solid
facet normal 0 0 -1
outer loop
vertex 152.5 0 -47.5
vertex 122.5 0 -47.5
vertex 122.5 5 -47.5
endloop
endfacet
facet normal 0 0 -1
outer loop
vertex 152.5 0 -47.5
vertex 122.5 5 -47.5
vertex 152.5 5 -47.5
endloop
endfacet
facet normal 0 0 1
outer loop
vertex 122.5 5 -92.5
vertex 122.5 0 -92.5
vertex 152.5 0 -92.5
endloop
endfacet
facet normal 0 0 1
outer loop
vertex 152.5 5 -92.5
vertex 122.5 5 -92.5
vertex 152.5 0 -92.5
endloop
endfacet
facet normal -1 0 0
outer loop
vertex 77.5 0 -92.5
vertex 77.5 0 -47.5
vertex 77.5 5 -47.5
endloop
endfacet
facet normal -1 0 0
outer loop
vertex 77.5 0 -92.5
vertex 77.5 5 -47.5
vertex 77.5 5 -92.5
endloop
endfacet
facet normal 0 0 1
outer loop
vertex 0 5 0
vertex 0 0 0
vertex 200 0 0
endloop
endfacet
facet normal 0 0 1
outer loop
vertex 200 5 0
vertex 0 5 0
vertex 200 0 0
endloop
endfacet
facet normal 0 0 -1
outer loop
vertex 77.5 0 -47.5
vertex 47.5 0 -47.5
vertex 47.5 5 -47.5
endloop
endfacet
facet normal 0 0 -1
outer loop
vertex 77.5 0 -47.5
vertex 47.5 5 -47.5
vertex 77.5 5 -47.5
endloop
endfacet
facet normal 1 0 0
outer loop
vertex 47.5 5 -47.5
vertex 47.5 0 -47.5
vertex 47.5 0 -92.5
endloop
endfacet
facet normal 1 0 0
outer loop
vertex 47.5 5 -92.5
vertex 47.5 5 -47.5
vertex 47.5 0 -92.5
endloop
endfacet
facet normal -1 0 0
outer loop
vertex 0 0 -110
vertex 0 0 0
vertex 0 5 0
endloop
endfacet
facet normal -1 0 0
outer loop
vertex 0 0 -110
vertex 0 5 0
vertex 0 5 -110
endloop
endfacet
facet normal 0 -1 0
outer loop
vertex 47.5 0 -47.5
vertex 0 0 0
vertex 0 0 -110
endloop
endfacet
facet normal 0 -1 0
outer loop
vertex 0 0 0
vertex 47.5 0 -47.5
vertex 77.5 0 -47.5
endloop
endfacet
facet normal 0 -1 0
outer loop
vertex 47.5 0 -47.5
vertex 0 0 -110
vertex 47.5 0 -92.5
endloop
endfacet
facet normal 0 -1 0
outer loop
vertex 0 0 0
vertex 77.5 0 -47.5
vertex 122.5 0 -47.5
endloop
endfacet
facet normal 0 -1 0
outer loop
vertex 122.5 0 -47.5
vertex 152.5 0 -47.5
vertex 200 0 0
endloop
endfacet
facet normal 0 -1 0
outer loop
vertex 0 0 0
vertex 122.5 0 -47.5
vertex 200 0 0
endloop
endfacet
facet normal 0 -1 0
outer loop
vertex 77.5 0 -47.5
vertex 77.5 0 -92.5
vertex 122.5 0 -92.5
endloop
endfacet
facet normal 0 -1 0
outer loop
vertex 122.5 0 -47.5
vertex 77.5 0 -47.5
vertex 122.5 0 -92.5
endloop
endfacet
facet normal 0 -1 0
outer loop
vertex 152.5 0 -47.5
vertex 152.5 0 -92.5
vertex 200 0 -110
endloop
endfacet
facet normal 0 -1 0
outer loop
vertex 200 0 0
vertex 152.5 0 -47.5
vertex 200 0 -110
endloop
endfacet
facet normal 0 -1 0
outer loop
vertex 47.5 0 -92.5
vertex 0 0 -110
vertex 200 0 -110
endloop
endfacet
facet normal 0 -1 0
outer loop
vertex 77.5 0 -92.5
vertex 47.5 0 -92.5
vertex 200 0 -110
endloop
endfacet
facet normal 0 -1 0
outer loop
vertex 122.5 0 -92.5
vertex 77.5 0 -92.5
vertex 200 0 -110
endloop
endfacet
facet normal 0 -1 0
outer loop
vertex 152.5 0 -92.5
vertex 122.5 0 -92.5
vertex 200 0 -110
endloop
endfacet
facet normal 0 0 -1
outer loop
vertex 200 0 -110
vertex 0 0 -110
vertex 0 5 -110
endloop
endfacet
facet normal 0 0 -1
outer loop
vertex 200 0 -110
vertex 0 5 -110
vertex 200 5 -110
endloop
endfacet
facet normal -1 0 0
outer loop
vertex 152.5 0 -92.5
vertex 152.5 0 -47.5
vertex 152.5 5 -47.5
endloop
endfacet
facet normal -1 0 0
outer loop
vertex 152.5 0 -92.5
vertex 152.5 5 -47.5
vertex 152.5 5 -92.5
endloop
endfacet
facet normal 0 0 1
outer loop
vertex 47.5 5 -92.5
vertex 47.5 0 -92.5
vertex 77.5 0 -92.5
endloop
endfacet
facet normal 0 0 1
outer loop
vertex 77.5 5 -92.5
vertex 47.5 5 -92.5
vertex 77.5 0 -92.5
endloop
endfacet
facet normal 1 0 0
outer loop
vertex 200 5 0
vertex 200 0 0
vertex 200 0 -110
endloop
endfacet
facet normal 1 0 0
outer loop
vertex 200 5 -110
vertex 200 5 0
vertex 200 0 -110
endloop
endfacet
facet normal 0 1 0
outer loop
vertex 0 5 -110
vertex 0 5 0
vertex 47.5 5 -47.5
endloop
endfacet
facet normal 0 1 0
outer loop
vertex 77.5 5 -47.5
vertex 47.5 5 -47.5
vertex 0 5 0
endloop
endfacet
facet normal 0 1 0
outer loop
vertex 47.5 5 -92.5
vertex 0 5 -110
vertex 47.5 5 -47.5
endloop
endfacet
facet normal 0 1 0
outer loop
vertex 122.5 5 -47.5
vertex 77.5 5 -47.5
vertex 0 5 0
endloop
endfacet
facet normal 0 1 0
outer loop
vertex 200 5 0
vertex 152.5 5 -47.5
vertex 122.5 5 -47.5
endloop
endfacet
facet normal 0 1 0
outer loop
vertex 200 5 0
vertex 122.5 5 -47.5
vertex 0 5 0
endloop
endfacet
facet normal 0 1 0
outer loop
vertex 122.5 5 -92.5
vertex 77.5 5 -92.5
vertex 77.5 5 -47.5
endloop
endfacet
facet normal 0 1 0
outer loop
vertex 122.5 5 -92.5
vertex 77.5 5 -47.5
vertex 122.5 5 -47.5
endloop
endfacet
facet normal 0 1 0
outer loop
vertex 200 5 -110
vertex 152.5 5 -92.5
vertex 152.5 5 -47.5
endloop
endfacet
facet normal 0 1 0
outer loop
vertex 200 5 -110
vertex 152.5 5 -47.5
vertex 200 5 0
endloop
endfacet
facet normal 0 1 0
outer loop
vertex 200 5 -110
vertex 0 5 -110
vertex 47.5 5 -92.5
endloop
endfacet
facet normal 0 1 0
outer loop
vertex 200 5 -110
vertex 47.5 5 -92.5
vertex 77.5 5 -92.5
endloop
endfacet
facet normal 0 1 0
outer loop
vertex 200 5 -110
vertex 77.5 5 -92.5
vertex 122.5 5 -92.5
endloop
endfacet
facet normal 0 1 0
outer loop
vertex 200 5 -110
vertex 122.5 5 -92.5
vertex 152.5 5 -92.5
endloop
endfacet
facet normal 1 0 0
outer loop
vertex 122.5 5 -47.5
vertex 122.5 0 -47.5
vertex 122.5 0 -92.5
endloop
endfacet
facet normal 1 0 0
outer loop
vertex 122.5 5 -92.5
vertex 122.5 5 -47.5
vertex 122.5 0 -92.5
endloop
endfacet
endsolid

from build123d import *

# Parameters (mm, degrees)
SKETCH_1_W      = 200
SKETCH_1_H      = 110
SKETCH_1_W_2    = 30
SKETCH_1_H_2    = 45
EXTRUDE_1_DEPTH = 5


with BuildPart() as part:
    # 草图1 → 凸台-拉伸1 (new body)
    with BuildSketch(Plane(origin=(0, 0, 0), x_dir=(1, 0, 0), z_dir=(0, 1, 0))):
        with Locations((100, 55)):
            Rectangle(SKETCH_1_W, SKETCH_1_H)
        with Locations((62.5, 70)):
            Rectangle(SKETCH_1_W_2, SKETCH_1_H_2, mode=Mode.SUBTRACT)
        with Locations((137.5, 70)):
            Rectangle(SKETCH_1_W_2, SKETCH_1_H_2, mode=Mode.SUBTRACT)
    extrude(amount=EXTRUDE_1_DEPTH)


solid = part.part
